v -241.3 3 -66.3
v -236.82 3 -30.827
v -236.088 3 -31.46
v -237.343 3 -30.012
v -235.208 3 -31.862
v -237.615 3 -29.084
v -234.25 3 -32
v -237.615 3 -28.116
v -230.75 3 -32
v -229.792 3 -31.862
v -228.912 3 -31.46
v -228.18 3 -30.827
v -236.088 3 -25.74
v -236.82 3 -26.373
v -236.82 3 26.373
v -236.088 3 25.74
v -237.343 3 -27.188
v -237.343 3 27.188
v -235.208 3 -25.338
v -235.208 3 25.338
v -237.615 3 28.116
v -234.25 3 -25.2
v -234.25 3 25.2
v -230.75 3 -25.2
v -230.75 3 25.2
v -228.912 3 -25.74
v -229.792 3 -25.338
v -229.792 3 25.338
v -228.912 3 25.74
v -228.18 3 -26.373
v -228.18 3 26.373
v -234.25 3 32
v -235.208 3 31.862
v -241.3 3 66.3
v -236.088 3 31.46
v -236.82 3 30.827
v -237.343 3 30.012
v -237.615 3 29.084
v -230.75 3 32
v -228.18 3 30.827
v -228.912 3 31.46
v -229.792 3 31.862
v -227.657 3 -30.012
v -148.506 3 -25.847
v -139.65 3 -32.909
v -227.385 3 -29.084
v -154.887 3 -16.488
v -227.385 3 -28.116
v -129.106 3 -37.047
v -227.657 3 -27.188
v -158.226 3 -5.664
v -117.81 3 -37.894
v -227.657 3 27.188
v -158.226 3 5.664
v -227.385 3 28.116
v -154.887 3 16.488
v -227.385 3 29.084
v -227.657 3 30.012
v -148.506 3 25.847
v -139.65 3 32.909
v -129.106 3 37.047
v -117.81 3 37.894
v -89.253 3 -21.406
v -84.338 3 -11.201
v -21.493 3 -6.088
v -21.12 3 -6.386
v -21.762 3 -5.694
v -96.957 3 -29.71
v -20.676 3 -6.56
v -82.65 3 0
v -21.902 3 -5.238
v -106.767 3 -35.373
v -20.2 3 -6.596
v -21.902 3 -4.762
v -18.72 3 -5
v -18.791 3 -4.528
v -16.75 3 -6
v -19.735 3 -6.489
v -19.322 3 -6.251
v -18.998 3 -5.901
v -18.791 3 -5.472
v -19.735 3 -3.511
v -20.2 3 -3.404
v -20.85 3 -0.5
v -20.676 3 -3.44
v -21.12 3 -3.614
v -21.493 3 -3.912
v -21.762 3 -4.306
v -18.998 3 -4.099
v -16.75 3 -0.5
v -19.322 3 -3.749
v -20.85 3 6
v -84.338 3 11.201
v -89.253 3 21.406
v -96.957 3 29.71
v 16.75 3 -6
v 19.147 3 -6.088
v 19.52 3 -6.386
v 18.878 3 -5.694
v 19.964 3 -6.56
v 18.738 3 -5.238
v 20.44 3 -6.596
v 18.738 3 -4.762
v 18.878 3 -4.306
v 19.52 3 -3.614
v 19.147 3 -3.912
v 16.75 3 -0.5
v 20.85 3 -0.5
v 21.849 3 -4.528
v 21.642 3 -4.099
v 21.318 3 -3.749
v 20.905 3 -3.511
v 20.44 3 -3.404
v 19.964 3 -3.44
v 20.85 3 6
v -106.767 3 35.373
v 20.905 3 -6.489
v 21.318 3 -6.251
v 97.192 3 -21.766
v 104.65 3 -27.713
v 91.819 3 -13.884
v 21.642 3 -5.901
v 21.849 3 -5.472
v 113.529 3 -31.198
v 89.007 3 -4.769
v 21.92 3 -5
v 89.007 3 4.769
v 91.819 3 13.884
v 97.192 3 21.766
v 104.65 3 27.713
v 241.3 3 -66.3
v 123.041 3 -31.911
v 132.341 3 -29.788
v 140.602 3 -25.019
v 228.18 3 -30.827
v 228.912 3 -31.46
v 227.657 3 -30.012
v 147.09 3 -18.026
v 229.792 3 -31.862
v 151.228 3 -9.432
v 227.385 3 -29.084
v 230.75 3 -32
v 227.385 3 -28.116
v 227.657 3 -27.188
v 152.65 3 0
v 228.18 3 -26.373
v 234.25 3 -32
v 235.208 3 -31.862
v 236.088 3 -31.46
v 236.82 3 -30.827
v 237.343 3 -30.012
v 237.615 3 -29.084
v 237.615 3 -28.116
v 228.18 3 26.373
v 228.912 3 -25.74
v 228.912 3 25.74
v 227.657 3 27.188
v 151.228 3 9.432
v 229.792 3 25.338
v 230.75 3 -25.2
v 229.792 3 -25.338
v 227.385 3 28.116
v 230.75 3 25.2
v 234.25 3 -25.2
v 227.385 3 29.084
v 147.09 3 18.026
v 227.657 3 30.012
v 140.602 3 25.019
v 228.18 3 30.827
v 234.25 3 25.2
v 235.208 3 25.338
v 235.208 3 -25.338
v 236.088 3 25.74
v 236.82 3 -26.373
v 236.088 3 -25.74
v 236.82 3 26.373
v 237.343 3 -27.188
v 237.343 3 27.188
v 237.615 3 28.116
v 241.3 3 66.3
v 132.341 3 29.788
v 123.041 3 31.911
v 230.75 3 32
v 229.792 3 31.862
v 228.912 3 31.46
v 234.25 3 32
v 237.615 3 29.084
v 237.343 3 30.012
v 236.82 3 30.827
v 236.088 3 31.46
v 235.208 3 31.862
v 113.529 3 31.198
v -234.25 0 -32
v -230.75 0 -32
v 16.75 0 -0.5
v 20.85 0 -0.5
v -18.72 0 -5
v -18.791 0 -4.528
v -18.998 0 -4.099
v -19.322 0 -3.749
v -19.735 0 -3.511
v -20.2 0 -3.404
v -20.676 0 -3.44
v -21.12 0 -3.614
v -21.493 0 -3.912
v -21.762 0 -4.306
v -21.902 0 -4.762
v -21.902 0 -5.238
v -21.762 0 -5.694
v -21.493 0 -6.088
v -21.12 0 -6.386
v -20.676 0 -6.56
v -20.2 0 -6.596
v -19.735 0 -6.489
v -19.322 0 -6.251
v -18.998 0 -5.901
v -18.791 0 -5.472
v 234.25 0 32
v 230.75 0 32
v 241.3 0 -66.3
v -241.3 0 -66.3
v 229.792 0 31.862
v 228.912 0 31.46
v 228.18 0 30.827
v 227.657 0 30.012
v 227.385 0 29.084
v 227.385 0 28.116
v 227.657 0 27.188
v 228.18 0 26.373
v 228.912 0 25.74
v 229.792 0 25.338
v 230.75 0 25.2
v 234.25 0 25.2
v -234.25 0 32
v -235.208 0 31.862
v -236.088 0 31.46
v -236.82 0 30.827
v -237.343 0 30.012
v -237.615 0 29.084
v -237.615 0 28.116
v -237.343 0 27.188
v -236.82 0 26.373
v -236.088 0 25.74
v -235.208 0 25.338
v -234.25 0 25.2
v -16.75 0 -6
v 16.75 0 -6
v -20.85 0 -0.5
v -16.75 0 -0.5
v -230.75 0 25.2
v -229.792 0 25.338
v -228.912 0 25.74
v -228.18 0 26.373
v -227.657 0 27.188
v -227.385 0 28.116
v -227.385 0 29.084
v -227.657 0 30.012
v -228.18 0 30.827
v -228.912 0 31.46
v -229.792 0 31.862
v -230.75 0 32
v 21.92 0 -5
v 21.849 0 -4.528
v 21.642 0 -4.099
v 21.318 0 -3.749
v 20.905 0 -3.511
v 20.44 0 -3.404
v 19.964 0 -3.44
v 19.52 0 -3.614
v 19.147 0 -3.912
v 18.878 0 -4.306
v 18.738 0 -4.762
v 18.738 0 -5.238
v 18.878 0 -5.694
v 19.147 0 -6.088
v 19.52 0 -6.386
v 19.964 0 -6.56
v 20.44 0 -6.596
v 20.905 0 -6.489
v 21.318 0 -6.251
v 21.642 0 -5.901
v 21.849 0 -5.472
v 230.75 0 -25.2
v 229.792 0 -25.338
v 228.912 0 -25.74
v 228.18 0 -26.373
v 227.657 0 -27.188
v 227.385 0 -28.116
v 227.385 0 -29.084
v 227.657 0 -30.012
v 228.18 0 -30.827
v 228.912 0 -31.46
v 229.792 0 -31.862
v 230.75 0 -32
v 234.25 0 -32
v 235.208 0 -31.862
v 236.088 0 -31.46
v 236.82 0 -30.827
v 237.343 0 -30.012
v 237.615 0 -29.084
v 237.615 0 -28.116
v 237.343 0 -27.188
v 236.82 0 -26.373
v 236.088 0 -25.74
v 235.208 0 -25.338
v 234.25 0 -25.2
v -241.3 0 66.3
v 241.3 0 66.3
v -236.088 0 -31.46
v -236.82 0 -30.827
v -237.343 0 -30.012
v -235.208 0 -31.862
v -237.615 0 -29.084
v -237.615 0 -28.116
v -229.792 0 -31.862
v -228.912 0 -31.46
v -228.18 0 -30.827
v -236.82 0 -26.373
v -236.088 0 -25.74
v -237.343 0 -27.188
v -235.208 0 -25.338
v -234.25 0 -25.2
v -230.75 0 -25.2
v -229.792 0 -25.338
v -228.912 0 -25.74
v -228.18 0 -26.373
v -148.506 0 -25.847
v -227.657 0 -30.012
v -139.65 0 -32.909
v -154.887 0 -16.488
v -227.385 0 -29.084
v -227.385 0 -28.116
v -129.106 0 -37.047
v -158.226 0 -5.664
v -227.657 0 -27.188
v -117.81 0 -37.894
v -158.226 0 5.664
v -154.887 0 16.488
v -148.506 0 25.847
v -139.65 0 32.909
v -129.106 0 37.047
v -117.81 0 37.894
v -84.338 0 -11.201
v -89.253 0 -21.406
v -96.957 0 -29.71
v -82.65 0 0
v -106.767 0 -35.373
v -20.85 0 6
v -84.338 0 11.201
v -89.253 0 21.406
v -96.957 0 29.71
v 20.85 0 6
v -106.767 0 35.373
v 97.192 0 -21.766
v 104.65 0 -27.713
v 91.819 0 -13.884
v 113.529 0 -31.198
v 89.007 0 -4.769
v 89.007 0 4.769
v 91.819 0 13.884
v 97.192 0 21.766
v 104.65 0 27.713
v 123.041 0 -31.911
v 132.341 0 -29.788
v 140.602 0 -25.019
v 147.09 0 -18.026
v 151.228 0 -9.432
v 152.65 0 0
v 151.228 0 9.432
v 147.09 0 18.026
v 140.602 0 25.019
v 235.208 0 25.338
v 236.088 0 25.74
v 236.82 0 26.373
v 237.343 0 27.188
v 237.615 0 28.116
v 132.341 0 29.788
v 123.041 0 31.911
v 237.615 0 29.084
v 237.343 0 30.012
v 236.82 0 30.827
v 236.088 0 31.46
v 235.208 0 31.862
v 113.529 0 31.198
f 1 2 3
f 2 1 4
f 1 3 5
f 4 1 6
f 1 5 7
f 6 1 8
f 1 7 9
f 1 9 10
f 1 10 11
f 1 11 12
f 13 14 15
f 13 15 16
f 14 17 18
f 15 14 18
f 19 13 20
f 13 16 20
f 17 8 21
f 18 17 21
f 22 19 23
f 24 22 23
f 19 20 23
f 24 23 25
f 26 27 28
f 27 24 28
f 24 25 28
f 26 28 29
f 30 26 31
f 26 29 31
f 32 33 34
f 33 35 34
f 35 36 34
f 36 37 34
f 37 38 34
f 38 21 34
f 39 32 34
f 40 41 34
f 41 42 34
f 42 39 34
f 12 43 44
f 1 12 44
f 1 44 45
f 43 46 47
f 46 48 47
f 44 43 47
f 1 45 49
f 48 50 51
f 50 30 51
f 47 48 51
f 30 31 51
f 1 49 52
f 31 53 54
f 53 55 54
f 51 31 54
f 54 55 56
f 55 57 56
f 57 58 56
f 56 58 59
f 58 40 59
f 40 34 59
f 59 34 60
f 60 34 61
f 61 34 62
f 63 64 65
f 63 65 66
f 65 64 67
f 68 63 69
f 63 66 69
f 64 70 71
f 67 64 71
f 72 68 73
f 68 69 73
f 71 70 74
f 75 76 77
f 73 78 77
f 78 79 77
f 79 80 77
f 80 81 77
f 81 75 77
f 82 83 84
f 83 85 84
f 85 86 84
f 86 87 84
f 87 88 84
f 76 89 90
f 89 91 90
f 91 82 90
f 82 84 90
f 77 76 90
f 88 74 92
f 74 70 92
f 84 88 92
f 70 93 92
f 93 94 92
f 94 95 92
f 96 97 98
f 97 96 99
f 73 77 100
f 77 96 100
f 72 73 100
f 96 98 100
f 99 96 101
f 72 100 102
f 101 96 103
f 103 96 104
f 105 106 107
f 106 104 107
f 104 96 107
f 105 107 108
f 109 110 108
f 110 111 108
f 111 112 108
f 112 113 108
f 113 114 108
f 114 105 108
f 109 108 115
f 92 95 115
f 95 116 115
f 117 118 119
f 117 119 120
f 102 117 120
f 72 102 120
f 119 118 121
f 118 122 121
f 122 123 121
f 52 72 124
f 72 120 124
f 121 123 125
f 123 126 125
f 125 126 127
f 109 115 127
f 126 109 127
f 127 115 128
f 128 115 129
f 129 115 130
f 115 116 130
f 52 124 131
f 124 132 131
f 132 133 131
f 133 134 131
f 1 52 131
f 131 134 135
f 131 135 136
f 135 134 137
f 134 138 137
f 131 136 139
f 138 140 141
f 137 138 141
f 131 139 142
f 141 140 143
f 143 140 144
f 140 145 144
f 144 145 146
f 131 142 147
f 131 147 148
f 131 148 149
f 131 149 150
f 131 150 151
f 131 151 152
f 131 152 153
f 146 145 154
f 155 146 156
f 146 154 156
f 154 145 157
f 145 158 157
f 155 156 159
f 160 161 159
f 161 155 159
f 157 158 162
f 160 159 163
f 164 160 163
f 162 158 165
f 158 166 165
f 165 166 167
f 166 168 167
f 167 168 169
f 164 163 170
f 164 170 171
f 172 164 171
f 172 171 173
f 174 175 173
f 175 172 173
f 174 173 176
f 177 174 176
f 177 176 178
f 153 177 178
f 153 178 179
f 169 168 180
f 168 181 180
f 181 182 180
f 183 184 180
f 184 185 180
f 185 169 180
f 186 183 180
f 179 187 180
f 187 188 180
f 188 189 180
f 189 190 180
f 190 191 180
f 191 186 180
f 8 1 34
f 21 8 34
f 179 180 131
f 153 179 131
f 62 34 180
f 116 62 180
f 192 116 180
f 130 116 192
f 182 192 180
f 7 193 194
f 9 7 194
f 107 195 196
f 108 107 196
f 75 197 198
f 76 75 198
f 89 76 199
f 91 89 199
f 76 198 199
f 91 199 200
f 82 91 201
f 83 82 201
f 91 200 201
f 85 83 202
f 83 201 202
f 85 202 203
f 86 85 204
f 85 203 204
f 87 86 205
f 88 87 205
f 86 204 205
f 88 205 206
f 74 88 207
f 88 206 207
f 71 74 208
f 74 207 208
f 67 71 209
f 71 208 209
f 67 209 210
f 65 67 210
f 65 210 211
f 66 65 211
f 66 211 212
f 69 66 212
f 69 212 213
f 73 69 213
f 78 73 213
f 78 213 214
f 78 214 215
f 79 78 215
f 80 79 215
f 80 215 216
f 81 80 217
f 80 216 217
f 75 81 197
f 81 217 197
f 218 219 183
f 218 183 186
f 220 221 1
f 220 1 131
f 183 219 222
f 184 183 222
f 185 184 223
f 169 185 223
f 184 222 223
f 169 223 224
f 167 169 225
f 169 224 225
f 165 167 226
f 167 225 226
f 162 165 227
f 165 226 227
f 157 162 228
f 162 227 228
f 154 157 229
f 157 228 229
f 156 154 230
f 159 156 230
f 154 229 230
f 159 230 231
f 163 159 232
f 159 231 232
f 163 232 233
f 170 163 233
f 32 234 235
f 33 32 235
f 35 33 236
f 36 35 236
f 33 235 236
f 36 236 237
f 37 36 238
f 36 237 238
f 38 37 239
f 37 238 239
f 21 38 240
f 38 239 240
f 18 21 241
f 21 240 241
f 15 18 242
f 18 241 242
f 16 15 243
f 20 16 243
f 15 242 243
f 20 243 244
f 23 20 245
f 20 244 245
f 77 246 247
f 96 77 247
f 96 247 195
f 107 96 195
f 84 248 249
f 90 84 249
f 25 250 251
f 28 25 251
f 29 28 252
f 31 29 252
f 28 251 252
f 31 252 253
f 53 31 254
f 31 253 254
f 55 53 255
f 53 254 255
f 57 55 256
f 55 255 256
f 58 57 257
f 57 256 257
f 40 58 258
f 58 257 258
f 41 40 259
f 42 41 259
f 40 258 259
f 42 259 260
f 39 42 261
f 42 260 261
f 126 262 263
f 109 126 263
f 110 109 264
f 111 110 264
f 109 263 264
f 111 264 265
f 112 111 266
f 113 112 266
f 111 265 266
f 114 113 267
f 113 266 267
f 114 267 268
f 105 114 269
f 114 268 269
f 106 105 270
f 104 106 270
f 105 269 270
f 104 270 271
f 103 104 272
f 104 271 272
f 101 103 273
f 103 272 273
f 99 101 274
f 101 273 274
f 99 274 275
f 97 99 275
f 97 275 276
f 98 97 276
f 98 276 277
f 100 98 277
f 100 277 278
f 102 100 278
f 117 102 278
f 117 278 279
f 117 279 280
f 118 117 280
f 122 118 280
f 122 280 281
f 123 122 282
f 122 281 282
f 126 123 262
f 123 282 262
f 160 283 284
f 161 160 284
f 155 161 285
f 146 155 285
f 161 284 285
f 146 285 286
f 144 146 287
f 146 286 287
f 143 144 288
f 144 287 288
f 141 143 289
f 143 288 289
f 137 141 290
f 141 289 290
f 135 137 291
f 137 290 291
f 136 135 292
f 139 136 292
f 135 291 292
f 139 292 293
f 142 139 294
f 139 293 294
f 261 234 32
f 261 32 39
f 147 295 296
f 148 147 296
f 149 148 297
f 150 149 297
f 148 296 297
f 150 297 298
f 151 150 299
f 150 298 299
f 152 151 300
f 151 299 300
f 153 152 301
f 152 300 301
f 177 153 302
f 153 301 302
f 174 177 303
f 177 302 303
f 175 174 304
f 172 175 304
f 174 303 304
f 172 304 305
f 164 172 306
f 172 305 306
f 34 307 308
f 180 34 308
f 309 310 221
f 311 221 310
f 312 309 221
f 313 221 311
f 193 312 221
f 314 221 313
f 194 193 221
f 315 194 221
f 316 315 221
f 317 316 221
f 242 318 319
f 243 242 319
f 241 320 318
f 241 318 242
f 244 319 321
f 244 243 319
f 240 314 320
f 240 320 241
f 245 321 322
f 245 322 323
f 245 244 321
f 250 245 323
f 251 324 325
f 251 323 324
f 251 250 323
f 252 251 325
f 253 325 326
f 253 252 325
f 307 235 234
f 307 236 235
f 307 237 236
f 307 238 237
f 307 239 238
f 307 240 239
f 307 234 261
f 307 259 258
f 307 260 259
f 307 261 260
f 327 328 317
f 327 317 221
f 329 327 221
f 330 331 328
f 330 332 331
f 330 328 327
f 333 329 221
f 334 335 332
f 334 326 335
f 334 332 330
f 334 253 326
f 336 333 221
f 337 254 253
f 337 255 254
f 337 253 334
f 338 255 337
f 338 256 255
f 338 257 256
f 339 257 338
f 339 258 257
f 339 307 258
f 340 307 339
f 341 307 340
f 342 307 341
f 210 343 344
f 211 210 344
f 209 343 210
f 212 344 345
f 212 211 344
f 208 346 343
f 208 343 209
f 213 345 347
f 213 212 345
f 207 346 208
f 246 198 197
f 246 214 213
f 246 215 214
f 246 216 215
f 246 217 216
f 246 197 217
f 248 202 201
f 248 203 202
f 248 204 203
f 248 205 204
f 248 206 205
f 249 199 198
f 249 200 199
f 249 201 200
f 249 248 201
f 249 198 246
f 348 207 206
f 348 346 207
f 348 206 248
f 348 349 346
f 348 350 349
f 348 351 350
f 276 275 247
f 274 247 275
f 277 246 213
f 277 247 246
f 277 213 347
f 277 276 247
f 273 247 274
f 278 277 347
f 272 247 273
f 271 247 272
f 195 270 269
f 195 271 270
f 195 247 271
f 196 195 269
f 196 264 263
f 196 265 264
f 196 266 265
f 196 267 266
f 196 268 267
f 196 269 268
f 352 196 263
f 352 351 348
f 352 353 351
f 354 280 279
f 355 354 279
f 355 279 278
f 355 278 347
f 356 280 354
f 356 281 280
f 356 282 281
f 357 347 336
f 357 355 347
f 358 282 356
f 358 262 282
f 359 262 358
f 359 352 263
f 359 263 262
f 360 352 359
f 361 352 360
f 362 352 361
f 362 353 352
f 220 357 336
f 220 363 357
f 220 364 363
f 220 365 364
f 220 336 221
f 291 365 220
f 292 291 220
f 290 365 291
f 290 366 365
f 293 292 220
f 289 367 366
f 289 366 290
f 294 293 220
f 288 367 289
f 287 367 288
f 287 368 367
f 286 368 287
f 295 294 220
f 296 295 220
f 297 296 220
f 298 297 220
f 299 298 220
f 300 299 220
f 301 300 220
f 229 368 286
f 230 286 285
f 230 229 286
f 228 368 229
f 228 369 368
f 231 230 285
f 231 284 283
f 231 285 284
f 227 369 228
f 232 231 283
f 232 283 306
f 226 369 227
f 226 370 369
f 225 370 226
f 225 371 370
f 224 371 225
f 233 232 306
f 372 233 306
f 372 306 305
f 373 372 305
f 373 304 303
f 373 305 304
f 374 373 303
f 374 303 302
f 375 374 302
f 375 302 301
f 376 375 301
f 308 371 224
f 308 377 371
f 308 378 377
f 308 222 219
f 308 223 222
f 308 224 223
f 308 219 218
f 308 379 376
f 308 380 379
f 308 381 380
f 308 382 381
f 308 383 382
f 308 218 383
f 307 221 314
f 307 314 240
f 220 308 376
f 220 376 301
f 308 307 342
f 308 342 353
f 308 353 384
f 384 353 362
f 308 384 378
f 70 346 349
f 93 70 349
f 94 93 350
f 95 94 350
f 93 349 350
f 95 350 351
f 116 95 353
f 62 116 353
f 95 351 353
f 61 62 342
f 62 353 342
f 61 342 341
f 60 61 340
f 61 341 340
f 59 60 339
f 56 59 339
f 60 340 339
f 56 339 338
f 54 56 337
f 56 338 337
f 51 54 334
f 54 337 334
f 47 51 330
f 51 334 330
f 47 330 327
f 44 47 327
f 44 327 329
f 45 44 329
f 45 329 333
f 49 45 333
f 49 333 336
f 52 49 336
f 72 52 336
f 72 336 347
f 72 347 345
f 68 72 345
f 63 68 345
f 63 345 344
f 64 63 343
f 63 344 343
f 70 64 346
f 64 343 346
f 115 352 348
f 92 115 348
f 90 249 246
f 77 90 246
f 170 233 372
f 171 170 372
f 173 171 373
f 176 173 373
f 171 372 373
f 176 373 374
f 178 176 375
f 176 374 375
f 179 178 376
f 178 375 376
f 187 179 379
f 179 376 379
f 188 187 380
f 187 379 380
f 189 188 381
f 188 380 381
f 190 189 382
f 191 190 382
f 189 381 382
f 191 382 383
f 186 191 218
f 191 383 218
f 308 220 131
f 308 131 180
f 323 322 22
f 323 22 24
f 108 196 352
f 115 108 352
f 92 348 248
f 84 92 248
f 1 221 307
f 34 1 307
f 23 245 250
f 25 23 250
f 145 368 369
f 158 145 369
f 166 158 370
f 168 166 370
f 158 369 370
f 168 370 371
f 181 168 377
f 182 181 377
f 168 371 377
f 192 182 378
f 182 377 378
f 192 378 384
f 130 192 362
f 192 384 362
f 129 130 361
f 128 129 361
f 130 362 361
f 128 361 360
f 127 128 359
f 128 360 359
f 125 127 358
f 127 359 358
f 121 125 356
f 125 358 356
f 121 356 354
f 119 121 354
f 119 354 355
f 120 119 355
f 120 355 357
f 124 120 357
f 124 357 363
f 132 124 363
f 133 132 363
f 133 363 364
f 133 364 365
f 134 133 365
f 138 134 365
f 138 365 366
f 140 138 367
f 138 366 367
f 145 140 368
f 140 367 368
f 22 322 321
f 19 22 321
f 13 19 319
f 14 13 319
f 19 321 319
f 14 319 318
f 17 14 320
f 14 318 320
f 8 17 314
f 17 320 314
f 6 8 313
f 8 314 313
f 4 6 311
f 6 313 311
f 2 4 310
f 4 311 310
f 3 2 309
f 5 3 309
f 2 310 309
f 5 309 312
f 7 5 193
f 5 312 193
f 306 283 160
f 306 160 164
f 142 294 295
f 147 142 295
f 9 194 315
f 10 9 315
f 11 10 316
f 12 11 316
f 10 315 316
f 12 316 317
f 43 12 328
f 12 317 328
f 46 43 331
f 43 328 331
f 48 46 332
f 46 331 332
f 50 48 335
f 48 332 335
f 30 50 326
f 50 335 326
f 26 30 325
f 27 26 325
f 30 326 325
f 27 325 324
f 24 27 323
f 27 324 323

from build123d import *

# Parameters (mm, degrees)
F0_W     = 482.6
F0_H     = 132.6
F1_DEPTH = 3
F2_W     = 3.5
F2_H     = 6.8
F3_W     = 3.5
F3_H     = 6.8
F4_W     = 3.5
F4_H     = 6.8
F5_W     = 3.5
F5_H     = 6.8
F6_DEPTH = 3
F7_R     = 38
F7_R_2   = 32
F7_R_3   = 1.6
F8_DEPTH = 3


with BuildPart() as f1:
    # F0 (on Front) → F1 (new body)
    with BuildSketch(Plane.XZ):
        Rectangle(F0_W, F0_H)
    extrude(amount=-F1_DEPTH)

    # F2 (on face) + F3 (on face) + F4 (on face) + F5 (on face) → F6 (cut)
    with BuildSketch(Plane.XZ):
        with Locations((-232.5, 28.6)):
            Rectangle(F2_W, F2_H)
        with BuildLine():
            Line((-230.75, 32), (-230.75, 25.2))
            ThreePointArc((-230.75, 25.2), (-227.35, 28.6), (-230.75, 32))
        make_face()
        with BuildLine():
            ThreePointArc((-234.25, 32), (-237.65, 28.6), (-234.25, 25.2))
            Line((-234.25, 25.2), (-234.25, 32))
        make_face()
    with BuildSketch(Plane.XZ):
        with Locations((-232.5, -28.6)):
            Rectangle(F3_W, F3_H)
        with BuildLine():
            Line((-230.75, -25.2), (-230.75, -32))
            ThreePointArc((-230.75, -32), (-227.35, -28.6), (-230.75, -25.2))
        make_face()
        with BuildLine():
            ThreePointArc((-234.25, -25.2), (-237.65, -28.6), (-234.25, -32))
            Line((-234.25, -32), (-234.25, -25.2))
        make_face()
    with BuildSketch(Plane.XZ):
        with Locations((232.5, 28.6)):
            Rectangle(F4_W, F4_H)
        with BuildLine():
            ThreePointArc((234.25, 25.2), (237.65, 28.6), (234.25, 32))
            Line((234.25, 32), (234.25, 25.2))
        make_face()
        with BuildLine():
            Line((230.75, 25.2), (230.75, 32))
            ThreePointArc((230.75, 32), (227.35, 28.6), (230.75, 25.2))
        make_face()
    with BuildSketch(Plane.XZ):
        with Locations((232.5, -28.6)):
            Rectangle(F5_W, F5_H)
        with BuildLine():
            Line((234.25, -25.2), (234.25, -32))
            ThreePointArc((234.25, -32), (237.65, -28.6), (234.25, -25.2))
        make_face()
        with BuildLine():
            ThreePointArc((230.75, -25.2), (227.35, -28.6), (230.75, -32))
            Line((230.75, -32), (230.75, -25.2))
        make_face()
    extrude(amount=-F6_DEPTH, mode=Mode.SUBTRACT)

    # F7 (on face) → F8 (cut)
    with BuildSketch(Plane.XZ):
        with Locations((-120.65, 0)):
            Circle(F7_R)
        with Locations((120.65, 0)):
            Circle(F7_R_2)
        Polygon((20.85, -0.5), (20.85, 6), (-20.85, 6), (-20.85, -0.5), (-16.75, -0.5), (-16.75, -6), (16.75, -6), (16.75, -0.5), align=None)
        with Locations((20.32, -5)):
            Circle(F7_R_3)
        with Locations((-20.32, -5)):
            Circle(F7_R_3)
    extrude(amount=-F8_DEPTH, mode=Mode.SUBTRACT)


solid = f1.part
